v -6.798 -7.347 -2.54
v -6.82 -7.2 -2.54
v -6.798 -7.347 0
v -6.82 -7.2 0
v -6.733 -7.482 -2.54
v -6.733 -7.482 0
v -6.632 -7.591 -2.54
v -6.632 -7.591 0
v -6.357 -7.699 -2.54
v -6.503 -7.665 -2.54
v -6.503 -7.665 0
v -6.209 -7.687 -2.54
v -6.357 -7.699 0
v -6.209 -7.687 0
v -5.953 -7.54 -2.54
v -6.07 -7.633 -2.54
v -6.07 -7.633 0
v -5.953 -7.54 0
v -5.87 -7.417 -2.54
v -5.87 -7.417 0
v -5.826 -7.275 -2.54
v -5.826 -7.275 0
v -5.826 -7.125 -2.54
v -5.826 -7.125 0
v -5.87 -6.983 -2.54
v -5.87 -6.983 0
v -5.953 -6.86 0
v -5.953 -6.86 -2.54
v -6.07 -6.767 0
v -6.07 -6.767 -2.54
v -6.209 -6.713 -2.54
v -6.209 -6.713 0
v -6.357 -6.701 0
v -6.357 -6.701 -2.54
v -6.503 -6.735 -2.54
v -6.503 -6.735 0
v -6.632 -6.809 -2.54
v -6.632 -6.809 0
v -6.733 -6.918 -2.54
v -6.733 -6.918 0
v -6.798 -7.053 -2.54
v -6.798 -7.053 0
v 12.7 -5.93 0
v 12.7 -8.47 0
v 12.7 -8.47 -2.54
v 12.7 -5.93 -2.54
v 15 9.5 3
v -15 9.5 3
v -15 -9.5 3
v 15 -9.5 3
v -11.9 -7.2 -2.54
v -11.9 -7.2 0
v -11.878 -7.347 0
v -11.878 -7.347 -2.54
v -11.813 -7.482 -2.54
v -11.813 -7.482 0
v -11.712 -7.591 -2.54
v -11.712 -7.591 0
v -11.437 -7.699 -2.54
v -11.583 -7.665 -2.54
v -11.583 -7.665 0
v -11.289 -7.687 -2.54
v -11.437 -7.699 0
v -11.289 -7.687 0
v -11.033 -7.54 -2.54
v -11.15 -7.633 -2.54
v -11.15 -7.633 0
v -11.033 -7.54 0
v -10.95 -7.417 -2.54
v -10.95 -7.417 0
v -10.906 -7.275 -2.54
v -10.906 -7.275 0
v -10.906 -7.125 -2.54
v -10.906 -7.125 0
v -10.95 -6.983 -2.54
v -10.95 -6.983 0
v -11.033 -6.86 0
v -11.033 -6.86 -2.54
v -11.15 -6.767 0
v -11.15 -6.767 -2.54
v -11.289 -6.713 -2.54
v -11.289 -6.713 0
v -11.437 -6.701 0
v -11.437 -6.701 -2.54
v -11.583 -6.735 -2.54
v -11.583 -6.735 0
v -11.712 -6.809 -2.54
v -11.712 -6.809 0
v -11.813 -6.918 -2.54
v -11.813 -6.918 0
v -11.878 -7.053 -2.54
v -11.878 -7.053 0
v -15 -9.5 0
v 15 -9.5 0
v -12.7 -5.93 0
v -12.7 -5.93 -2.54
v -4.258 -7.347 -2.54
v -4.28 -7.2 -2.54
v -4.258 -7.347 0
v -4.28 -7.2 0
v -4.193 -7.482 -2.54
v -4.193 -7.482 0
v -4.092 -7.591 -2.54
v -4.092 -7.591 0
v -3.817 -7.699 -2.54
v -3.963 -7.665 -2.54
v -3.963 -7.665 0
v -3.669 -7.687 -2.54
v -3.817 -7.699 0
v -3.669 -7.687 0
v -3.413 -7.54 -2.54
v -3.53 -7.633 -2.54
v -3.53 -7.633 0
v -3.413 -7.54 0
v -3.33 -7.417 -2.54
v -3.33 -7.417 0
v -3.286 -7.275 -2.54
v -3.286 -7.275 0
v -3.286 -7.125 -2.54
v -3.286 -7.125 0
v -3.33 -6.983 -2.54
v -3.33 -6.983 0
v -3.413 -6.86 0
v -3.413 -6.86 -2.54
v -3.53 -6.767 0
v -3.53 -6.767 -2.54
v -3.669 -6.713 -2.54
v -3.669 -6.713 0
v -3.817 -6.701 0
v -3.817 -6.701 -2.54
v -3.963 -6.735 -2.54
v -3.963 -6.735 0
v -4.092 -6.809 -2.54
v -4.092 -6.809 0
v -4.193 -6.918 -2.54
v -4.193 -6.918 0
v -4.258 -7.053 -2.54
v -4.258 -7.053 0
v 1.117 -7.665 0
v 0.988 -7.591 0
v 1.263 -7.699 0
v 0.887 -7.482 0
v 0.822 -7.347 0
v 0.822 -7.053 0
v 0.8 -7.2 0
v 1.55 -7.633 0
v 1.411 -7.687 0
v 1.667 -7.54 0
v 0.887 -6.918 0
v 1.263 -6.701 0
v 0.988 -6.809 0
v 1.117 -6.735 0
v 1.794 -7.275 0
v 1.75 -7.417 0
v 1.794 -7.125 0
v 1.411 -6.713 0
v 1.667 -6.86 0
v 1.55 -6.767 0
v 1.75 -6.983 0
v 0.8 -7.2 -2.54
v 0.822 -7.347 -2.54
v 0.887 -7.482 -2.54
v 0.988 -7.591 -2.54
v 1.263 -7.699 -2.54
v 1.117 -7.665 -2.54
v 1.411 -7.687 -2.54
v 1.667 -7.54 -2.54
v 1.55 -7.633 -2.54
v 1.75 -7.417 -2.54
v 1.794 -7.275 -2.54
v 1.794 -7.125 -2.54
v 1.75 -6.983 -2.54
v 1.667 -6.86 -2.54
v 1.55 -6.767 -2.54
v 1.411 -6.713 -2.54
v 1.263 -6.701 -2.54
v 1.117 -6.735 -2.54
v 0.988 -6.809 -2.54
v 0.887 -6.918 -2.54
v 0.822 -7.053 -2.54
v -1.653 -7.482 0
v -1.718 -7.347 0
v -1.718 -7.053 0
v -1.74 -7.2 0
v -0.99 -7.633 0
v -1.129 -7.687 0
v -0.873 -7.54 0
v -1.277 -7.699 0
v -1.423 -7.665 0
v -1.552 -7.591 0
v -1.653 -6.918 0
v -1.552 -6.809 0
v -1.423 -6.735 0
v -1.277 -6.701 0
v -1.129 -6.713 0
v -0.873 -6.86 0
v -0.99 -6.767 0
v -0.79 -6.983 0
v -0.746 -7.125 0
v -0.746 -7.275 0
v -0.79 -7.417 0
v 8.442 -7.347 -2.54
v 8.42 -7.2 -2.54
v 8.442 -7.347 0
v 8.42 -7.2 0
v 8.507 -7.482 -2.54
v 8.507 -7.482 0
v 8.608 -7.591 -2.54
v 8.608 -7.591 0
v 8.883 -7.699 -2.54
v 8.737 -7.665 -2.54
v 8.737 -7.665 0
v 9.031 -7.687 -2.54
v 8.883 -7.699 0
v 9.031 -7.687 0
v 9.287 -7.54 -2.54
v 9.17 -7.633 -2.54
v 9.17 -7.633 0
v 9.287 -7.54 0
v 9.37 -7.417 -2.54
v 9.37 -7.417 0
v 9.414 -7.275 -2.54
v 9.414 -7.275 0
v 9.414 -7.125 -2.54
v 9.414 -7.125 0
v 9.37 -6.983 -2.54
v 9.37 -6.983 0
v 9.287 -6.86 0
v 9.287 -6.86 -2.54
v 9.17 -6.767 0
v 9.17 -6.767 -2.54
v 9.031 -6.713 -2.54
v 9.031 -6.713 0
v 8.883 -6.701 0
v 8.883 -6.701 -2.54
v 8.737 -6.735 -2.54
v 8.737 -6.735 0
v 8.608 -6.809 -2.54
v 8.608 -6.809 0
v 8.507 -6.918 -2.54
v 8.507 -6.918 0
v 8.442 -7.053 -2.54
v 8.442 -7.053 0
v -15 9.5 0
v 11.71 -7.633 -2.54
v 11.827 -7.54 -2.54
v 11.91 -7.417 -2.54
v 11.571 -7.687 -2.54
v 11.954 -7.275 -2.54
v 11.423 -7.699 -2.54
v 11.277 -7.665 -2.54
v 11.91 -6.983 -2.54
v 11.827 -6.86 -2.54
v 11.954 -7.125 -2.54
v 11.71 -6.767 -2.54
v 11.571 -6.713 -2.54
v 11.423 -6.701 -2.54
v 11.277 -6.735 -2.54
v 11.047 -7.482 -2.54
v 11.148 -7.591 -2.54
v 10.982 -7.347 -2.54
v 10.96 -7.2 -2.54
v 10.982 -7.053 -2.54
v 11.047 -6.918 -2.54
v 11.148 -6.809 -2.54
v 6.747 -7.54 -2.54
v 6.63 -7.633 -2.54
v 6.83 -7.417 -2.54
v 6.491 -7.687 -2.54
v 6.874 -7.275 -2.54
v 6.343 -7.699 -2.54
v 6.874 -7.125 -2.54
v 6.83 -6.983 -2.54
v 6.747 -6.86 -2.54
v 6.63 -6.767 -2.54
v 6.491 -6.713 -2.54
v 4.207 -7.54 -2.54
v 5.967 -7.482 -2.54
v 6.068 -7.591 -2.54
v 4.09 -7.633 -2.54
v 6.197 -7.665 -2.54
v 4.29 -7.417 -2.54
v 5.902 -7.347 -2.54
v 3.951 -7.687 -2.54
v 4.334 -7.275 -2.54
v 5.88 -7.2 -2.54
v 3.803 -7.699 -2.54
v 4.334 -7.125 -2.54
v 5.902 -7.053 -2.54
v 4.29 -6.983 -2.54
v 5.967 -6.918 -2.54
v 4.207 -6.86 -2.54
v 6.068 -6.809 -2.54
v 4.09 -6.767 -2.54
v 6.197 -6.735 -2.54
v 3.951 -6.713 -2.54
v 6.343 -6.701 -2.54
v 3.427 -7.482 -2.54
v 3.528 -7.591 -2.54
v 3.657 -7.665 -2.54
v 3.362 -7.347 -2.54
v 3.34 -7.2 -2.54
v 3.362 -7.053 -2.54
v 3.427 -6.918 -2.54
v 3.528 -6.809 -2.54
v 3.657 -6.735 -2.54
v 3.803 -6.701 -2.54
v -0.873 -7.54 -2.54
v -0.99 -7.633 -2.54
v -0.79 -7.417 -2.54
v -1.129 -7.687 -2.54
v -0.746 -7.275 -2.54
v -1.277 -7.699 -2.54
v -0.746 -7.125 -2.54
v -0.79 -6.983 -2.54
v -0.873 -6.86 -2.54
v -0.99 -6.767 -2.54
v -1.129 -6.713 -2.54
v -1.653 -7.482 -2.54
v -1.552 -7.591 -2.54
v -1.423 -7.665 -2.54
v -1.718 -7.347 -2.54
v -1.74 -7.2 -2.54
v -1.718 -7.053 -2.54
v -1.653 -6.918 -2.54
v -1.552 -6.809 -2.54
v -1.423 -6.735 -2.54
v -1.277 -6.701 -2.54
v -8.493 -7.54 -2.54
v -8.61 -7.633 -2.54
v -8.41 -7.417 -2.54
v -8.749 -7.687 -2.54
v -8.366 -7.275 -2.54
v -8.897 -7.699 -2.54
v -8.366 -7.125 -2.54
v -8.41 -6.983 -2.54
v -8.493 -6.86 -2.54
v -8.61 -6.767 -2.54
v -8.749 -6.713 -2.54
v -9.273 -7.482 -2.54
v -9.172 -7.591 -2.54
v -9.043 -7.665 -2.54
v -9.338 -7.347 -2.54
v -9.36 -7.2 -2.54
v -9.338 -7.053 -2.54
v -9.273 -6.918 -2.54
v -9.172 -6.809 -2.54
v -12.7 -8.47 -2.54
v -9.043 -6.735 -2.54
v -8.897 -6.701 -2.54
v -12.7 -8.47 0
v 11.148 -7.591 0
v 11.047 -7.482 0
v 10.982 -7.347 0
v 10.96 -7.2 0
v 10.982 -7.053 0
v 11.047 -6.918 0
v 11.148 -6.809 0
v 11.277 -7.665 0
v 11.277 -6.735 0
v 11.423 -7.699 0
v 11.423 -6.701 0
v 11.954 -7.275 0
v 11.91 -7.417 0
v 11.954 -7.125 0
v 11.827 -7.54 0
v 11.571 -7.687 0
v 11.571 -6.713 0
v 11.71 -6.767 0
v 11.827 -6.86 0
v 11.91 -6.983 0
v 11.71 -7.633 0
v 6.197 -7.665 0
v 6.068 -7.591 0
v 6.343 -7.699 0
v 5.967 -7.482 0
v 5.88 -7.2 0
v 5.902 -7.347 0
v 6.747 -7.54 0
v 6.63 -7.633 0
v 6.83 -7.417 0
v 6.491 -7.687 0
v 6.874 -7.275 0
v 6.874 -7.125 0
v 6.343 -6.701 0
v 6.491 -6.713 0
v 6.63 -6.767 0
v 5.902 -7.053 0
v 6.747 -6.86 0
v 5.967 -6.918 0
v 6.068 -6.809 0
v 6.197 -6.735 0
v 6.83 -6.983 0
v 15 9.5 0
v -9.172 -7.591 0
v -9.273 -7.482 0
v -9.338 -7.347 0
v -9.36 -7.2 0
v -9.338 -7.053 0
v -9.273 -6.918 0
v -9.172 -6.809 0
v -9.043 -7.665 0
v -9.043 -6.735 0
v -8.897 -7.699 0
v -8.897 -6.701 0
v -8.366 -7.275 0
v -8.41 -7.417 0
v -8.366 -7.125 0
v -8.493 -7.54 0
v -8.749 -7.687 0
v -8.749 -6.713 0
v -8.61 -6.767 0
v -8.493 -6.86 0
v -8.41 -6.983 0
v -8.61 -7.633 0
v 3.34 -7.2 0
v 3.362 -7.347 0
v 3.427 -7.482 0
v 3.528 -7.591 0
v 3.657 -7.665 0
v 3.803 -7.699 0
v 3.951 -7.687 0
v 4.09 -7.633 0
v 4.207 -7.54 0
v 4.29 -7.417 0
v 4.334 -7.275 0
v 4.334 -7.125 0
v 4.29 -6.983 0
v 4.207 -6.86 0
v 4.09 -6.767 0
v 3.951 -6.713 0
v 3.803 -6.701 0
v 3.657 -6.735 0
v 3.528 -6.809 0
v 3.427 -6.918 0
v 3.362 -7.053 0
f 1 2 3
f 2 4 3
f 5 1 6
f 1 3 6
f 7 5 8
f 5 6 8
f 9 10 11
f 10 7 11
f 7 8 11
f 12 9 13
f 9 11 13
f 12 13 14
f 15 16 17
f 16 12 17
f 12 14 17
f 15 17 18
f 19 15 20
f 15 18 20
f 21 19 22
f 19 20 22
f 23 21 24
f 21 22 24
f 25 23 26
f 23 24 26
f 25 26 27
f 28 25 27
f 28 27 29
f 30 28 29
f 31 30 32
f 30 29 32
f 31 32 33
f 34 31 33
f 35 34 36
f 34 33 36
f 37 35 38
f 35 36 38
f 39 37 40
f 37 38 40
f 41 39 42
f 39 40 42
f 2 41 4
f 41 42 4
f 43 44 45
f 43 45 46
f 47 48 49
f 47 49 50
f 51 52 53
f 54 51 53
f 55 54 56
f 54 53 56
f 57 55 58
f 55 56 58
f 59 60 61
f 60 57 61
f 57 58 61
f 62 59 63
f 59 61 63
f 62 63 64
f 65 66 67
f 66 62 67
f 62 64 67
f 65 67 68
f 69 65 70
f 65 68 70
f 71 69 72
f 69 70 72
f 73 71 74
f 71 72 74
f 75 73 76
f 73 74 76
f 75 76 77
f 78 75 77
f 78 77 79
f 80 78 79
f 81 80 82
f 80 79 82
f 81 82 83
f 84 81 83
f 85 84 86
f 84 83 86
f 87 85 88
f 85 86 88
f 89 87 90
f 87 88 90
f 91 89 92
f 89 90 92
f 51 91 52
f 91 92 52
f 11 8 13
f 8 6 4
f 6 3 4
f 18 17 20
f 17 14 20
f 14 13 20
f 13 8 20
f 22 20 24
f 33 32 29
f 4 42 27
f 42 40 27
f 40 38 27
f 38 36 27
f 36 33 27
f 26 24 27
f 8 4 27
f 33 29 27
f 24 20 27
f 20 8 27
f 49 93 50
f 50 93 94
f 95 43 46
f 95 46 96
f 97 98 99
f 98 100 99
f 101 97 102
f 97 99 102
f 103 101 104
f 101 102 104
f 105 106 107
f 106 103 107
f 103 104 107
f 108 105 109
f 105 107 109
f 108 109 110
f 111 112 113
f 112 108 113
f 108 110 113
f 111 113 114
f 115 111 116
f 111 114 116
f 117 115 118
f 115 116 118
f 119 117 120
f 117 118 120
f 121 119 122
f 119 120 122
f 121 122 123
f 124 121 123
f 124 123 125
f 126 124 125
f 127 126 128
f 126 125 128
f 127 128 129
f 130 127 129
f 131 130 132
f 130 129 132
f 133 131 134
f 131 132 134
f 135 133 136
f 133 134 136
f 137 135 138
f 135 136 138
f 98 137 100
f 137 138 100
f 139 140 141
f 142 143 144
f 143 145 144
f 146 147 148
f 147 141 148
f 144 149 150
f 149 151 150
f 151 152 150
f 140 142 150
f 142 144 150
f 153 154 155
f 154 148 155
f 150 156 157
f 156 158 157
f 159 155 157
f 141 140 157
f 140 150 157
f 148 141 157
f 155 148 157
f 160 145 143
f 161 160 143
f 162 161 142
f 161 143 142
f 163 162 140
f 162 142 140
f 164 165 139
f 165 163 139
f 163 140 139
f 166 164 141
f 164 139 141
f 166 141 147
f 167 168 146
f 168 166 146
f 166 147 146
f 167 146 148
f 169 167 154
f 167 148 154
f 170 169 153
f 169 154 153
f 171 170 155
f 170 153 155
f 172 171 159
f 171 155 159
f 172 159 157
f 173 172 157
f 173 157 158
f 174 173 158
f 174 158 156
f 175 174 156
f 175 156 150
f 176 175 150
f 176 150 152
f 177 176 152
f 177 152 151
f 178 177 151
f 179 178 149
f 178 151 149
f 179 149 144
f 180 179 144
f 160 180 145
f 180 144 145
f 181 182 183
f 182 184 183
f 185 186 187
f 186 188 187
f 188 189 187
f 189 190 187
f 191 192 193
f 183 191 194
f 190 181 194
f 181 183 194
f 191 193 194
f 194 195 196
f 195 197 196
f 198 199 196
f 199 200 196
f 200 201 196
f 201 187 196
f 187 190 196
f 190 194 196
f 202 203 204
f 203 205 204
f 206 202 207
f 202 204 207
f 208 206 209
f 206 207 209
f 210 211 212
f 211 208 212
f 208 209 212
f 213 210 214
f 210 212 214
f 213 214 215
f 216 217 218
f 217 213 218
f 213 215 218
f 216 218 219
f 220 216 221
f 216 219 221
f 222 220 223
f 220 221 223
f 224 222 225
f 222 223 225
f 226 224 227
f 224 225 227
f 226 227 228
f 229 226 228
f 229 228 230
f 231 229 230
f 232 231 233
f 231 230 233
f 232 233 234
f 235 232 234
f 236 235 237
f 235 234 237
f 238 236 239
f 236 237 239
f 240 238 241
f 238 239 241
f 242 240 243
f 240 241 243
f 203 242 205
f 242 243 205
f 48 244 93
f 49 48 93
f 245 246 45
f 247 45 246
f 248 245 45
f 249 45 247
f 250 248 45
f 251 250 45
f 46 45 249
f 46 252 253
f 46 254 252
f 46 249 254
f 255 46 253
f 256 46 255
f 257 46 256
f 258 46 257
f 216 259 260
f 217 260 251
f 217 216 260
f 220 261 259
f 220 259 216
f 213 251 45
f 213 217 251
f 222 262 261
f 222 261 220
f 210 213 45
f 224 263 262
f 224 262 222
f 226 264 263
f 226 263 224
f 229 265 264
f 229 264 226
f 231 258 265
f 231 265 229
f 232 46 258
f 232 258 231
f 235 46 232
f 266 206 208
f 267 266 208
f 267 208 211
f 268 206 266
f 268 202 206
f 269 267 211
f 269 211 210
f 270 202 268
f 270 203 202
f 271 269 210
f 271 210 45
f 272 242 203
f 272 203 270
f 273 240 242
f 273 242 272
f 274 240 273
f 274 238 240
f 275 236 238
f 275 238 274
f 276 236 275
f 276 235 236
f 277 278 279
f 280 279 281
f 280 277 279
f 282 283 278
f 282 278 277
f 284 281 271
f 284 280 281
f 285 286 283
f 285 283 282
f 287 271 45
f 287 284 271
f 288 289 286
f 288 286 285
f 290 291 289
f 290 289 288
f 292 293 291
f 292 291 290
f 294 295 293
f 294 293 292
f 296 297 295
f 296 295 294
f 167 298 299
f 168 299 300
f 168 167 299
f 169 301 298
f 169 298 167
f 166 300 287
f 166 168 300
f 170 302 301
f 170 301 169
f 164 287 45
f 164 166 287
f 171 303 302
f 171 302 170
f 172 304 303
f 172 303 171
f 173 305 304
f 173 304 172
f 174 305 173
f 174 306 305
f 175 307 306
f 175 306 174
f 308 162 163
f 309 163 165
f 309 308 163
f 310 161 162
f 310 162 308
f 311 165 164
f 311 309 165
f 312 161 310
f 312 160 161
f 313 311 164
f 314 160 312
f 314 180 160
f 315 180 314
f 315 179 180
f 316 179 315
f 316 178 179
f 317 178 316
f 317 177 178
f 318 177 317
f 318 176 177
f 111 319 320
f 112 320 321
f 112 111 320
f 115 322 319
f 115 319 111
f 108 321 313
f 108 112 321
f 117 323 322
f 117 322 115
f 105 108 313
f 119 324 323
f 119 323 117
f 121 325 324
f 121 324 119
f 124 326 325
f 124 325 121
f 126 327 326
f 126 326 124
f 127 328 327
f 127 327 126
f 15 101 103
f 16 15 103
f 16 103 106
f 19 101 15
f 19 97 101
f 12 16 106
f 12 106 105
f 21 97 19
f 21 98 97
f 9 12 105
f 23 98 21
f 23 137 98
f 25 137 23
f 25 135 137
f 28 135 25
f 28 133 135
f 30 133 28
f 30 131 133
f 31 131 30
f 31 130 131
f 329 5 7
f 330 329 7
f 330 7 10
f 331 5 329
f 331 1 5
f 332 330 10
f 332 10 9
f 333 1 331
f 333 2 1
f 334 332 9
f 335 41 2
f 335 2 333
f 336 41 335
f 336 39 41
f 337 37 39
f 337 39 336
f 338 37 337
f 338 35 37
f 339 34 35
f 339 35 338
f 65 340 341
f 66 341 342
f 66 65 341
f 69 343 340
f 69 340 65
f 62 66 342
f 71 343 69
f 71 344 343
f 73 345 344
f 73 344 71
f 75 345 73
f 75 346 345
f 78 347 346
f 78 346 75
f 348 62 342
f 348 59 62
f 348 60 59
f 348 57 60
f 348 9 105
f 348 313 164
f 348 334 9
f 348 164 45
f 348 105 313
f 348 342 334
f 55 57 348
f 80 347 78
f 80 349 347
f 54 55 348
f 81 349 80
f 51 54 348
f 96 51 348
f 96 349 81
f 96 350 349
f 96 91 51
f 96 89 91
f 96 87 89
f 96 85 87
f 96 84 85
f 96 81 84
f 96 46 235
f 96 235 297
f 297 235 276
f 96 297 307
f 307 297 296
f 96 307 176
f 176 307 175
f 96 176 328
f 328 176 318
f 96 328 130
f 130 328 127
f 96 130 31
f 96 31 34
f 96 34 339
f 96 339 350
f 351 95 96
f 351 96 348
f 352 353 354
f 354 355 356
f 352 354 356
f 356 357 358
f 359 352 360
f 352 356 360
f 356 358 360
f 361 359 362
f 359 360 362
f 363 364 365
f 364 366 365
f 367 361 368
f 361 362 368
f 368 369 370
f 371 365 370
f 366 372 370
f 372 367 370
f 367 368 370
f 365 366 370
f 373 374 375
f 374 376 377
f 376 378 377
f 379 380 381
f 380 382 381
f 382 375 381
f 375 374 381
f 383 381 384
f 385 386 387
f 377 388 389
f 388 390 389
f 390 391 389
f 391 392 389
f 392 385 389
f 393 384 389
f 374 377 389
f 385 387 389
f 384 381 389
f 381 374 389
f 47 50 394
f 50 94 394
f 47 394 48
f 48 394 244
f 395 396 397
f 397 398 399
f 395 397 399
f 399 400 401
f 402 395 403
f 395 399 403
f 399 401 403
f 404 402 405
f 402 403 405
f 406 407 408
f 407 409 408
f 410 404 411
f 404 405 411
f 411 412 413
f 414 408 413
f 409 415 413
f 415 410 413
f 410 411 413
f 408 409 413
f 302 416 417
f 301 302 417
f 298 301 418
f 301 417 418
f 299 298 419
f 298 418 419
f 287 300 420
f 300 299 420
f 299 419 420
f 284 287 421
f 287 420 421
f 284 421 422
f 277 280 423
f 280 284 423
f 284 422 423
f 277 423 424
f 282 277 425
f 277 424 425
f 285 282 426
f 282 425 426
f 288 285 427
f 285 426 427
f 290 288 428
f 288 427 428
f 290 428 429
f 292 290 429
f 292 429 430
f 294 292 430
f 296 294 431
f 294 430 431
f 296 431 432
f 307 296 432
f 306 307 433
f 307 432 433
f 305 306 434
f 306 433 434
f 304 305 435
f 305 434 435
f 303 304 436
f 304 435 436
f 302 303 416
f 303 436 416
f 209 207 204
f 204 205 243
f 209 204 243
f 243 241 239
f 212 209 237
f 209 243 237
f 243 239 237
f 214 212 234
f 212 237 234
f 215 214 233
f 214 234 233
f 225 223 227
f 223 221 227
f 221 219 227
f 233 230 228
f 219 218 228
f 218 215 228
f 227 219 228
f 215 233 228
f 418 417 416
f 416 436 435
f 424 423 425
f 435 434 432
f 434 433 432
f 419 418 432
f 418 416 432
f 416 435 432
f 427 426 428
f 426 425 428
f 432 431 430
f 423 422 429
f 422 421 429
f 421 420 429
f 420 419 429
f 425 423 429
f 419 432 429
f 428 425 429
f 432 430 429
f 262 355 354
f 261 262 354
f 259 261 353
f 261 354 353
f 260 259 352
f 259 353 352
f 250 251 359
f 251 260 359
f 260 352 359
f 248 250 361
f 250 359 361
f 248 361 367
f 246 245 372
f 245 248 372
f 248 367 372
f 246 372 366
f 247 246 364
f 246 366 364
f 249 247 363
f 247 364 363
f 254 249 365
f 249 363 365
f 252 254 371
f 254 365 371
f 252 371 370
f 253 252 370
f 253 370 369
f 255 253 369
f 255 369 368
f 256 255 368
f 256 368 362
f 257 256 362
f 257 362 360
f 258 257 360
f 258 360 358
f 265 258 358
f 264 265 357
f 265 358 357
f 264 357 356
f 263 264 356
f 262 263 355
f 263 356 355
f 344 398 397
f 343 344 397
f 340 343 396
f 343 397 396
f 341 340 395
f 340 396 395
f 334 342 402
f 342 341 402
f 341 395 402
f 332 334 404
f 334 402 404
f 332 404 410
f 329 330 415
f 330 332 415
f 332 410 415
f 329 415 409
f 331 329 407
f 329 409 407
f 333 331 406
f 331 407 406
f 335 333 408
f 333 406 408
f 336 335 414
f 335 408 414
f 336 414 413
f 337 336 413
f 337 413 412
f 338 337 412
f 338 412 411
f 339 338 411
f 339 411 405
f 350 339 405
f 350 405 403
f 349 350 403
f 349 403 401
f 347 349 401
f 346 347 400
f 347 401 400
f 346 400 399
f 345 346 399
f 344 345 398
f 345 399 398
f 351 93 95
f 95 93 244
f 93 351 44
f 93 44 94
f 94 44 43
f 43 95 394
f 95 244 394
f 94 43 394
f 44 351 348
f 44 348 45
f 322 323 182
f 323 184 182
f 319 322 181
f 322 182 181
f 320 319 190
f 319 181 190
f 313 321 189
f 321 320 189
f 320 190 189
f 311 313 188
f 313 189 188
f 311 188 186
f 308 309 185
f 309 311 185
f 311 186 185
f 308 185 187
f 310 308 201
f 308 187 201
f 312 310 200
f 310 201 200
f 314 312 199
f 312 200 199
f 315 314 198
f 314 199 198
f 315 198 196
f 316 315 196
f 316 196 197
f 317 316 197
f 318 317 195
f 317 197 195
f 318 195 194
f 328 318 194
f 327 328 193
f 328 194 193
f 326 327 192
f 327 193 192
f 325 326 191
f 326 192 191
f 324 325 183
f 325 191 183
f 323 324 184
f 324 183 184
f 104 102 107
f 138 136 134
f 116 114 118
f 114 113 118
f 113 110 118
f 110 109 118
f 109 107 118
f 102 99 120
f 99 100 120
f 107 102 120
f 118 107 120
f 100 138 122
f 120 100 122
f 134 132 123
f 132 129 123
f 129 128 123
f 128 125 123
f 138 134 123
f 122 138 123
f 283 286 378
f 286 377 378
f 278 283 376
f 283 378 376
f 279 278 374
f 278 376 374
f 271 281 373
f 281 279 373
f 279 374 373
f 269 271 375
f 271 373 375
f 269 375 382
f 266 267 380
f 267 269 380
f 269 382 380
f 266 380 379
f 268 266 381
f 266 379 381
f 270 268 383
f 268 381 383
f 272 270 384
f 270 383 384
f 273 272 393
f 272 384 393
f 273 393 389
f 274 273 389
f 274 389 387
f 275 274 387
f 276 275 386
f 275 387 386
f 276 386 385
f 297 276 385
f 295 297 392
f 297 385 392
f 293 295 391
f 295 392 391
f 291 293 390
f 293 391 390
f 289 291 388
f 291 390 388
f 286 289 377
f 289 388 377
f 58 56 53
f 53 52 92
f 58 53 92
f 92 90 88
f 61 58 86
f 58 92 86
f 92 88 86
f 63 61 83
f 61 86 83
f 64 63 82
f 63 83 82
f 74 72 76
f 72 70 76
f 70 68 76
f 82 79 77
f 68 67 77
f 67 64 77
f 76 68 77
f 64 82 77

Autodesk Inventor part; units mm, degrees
ref_plane "YZ Plane" through (0, 0, 0) normal (1, 0, 0) x (0, 1, 0)
ref_plane "XZ Plane" through (0, 0, 0) normal (0, 1, 0) x (-1, 0, 0)
ref_plane "XY Plane" through (0, 0, 0) normal (0, 0, 1) x (1, 0, 0)
sketch "Sketch1" plane through (0, 0, 0) normal (0, 0, 1) x (1, 0, 0)
  line L0 (-15, -9.5) -> (15, -9.5)
  line L1 (15, -9.5) -> (15, 9.5)
  line L2 (15, 9.5) -> (-15, 9.5)
  line L3 (-15, 9.5) -> (-15, -9.5)
  point P0 (0, 0)
  point P1 (0, 9.5)
  point P2 (15, 0)
  dimension "d0" = 30
  dimension "d1" = 19
extrude "Extrusion1" add sketch "Sketch1" along normal blind 3
sketch "Sketch2" plane through (0, 0, 0) normal (0, 0, -1) x (-1, 0, 0)
  line L0 (-12.7, -5.93) -> (12.7, -5.93)
  line L1 (12.7, -5.93) -> (12.7, -8.47)
  line L2 (12.7, -8.47) -> (-12.7, -8.47)
  line L3 (-12.7, -8.47) -> (-12.7, -5.93)
  line L4 (15, -9.5) -> (-15, -9.5) projected
  circle A0 centre (-11.46, -7.2) radius 0.5
  circle A1 centre (-8.92, -7.2) radius 0.5
  circle A2 centre (-6.38, -7.2) radius 0.5
  circle A3 centre (-3.84, -7.2) radius 0.5
  circle A4 centre (-1.3, -7.2) radius 0.5
  circle A5 centre (1.24, -7.2) radius 0.5
  circle A6 centre (3.78, -7.2) radius 0.5
  circle A7 centre (6.32, -7.2) radius 0.5
  circle A8 centre (8.86, -7.2) radius 0.5
  circle A9 centre (11.4, -7.2) radius 0.5
  line L5 (15, 9.5) -> (15, -9.5) projected
  point P0 (0, 0)
  point P1 (-12.7, -7.2)
  point P2 (0, -5.93)
  point P3 (12.7, -7.2)
  dimension "d4" = 2.3
  dimension "d5" = 2.54
  dimension "d6" = 25.4
  dimension "d7" = 3.6
  dimension "d8" = 2.54
  dimension "d9" = 2.54
  dimension "d10" = 2.54
  dimension "d11" = 2.54
  dimension "d12" = 2.54
  dimension "d13" = 2.54
  dimension "d14" = 2.54
  dimension "d15" = 2.54
  dimension "d16" = 2.54
  dimension "d17" = 1
extrude "Extrusion2" add sketch "Sketch2" along normal blind 2.54
equation "\"d9\" = d8"
equation "\"d10\" = d8"
equation "\"d11\" = d8"
equation "\"d12\" = d8"
equation "\"d13\" = d8"
equation "\"d14\" = d8"
equation "\"d15\" = d8"
equation "\"d16\" = d8"
properties part number "IMU"
